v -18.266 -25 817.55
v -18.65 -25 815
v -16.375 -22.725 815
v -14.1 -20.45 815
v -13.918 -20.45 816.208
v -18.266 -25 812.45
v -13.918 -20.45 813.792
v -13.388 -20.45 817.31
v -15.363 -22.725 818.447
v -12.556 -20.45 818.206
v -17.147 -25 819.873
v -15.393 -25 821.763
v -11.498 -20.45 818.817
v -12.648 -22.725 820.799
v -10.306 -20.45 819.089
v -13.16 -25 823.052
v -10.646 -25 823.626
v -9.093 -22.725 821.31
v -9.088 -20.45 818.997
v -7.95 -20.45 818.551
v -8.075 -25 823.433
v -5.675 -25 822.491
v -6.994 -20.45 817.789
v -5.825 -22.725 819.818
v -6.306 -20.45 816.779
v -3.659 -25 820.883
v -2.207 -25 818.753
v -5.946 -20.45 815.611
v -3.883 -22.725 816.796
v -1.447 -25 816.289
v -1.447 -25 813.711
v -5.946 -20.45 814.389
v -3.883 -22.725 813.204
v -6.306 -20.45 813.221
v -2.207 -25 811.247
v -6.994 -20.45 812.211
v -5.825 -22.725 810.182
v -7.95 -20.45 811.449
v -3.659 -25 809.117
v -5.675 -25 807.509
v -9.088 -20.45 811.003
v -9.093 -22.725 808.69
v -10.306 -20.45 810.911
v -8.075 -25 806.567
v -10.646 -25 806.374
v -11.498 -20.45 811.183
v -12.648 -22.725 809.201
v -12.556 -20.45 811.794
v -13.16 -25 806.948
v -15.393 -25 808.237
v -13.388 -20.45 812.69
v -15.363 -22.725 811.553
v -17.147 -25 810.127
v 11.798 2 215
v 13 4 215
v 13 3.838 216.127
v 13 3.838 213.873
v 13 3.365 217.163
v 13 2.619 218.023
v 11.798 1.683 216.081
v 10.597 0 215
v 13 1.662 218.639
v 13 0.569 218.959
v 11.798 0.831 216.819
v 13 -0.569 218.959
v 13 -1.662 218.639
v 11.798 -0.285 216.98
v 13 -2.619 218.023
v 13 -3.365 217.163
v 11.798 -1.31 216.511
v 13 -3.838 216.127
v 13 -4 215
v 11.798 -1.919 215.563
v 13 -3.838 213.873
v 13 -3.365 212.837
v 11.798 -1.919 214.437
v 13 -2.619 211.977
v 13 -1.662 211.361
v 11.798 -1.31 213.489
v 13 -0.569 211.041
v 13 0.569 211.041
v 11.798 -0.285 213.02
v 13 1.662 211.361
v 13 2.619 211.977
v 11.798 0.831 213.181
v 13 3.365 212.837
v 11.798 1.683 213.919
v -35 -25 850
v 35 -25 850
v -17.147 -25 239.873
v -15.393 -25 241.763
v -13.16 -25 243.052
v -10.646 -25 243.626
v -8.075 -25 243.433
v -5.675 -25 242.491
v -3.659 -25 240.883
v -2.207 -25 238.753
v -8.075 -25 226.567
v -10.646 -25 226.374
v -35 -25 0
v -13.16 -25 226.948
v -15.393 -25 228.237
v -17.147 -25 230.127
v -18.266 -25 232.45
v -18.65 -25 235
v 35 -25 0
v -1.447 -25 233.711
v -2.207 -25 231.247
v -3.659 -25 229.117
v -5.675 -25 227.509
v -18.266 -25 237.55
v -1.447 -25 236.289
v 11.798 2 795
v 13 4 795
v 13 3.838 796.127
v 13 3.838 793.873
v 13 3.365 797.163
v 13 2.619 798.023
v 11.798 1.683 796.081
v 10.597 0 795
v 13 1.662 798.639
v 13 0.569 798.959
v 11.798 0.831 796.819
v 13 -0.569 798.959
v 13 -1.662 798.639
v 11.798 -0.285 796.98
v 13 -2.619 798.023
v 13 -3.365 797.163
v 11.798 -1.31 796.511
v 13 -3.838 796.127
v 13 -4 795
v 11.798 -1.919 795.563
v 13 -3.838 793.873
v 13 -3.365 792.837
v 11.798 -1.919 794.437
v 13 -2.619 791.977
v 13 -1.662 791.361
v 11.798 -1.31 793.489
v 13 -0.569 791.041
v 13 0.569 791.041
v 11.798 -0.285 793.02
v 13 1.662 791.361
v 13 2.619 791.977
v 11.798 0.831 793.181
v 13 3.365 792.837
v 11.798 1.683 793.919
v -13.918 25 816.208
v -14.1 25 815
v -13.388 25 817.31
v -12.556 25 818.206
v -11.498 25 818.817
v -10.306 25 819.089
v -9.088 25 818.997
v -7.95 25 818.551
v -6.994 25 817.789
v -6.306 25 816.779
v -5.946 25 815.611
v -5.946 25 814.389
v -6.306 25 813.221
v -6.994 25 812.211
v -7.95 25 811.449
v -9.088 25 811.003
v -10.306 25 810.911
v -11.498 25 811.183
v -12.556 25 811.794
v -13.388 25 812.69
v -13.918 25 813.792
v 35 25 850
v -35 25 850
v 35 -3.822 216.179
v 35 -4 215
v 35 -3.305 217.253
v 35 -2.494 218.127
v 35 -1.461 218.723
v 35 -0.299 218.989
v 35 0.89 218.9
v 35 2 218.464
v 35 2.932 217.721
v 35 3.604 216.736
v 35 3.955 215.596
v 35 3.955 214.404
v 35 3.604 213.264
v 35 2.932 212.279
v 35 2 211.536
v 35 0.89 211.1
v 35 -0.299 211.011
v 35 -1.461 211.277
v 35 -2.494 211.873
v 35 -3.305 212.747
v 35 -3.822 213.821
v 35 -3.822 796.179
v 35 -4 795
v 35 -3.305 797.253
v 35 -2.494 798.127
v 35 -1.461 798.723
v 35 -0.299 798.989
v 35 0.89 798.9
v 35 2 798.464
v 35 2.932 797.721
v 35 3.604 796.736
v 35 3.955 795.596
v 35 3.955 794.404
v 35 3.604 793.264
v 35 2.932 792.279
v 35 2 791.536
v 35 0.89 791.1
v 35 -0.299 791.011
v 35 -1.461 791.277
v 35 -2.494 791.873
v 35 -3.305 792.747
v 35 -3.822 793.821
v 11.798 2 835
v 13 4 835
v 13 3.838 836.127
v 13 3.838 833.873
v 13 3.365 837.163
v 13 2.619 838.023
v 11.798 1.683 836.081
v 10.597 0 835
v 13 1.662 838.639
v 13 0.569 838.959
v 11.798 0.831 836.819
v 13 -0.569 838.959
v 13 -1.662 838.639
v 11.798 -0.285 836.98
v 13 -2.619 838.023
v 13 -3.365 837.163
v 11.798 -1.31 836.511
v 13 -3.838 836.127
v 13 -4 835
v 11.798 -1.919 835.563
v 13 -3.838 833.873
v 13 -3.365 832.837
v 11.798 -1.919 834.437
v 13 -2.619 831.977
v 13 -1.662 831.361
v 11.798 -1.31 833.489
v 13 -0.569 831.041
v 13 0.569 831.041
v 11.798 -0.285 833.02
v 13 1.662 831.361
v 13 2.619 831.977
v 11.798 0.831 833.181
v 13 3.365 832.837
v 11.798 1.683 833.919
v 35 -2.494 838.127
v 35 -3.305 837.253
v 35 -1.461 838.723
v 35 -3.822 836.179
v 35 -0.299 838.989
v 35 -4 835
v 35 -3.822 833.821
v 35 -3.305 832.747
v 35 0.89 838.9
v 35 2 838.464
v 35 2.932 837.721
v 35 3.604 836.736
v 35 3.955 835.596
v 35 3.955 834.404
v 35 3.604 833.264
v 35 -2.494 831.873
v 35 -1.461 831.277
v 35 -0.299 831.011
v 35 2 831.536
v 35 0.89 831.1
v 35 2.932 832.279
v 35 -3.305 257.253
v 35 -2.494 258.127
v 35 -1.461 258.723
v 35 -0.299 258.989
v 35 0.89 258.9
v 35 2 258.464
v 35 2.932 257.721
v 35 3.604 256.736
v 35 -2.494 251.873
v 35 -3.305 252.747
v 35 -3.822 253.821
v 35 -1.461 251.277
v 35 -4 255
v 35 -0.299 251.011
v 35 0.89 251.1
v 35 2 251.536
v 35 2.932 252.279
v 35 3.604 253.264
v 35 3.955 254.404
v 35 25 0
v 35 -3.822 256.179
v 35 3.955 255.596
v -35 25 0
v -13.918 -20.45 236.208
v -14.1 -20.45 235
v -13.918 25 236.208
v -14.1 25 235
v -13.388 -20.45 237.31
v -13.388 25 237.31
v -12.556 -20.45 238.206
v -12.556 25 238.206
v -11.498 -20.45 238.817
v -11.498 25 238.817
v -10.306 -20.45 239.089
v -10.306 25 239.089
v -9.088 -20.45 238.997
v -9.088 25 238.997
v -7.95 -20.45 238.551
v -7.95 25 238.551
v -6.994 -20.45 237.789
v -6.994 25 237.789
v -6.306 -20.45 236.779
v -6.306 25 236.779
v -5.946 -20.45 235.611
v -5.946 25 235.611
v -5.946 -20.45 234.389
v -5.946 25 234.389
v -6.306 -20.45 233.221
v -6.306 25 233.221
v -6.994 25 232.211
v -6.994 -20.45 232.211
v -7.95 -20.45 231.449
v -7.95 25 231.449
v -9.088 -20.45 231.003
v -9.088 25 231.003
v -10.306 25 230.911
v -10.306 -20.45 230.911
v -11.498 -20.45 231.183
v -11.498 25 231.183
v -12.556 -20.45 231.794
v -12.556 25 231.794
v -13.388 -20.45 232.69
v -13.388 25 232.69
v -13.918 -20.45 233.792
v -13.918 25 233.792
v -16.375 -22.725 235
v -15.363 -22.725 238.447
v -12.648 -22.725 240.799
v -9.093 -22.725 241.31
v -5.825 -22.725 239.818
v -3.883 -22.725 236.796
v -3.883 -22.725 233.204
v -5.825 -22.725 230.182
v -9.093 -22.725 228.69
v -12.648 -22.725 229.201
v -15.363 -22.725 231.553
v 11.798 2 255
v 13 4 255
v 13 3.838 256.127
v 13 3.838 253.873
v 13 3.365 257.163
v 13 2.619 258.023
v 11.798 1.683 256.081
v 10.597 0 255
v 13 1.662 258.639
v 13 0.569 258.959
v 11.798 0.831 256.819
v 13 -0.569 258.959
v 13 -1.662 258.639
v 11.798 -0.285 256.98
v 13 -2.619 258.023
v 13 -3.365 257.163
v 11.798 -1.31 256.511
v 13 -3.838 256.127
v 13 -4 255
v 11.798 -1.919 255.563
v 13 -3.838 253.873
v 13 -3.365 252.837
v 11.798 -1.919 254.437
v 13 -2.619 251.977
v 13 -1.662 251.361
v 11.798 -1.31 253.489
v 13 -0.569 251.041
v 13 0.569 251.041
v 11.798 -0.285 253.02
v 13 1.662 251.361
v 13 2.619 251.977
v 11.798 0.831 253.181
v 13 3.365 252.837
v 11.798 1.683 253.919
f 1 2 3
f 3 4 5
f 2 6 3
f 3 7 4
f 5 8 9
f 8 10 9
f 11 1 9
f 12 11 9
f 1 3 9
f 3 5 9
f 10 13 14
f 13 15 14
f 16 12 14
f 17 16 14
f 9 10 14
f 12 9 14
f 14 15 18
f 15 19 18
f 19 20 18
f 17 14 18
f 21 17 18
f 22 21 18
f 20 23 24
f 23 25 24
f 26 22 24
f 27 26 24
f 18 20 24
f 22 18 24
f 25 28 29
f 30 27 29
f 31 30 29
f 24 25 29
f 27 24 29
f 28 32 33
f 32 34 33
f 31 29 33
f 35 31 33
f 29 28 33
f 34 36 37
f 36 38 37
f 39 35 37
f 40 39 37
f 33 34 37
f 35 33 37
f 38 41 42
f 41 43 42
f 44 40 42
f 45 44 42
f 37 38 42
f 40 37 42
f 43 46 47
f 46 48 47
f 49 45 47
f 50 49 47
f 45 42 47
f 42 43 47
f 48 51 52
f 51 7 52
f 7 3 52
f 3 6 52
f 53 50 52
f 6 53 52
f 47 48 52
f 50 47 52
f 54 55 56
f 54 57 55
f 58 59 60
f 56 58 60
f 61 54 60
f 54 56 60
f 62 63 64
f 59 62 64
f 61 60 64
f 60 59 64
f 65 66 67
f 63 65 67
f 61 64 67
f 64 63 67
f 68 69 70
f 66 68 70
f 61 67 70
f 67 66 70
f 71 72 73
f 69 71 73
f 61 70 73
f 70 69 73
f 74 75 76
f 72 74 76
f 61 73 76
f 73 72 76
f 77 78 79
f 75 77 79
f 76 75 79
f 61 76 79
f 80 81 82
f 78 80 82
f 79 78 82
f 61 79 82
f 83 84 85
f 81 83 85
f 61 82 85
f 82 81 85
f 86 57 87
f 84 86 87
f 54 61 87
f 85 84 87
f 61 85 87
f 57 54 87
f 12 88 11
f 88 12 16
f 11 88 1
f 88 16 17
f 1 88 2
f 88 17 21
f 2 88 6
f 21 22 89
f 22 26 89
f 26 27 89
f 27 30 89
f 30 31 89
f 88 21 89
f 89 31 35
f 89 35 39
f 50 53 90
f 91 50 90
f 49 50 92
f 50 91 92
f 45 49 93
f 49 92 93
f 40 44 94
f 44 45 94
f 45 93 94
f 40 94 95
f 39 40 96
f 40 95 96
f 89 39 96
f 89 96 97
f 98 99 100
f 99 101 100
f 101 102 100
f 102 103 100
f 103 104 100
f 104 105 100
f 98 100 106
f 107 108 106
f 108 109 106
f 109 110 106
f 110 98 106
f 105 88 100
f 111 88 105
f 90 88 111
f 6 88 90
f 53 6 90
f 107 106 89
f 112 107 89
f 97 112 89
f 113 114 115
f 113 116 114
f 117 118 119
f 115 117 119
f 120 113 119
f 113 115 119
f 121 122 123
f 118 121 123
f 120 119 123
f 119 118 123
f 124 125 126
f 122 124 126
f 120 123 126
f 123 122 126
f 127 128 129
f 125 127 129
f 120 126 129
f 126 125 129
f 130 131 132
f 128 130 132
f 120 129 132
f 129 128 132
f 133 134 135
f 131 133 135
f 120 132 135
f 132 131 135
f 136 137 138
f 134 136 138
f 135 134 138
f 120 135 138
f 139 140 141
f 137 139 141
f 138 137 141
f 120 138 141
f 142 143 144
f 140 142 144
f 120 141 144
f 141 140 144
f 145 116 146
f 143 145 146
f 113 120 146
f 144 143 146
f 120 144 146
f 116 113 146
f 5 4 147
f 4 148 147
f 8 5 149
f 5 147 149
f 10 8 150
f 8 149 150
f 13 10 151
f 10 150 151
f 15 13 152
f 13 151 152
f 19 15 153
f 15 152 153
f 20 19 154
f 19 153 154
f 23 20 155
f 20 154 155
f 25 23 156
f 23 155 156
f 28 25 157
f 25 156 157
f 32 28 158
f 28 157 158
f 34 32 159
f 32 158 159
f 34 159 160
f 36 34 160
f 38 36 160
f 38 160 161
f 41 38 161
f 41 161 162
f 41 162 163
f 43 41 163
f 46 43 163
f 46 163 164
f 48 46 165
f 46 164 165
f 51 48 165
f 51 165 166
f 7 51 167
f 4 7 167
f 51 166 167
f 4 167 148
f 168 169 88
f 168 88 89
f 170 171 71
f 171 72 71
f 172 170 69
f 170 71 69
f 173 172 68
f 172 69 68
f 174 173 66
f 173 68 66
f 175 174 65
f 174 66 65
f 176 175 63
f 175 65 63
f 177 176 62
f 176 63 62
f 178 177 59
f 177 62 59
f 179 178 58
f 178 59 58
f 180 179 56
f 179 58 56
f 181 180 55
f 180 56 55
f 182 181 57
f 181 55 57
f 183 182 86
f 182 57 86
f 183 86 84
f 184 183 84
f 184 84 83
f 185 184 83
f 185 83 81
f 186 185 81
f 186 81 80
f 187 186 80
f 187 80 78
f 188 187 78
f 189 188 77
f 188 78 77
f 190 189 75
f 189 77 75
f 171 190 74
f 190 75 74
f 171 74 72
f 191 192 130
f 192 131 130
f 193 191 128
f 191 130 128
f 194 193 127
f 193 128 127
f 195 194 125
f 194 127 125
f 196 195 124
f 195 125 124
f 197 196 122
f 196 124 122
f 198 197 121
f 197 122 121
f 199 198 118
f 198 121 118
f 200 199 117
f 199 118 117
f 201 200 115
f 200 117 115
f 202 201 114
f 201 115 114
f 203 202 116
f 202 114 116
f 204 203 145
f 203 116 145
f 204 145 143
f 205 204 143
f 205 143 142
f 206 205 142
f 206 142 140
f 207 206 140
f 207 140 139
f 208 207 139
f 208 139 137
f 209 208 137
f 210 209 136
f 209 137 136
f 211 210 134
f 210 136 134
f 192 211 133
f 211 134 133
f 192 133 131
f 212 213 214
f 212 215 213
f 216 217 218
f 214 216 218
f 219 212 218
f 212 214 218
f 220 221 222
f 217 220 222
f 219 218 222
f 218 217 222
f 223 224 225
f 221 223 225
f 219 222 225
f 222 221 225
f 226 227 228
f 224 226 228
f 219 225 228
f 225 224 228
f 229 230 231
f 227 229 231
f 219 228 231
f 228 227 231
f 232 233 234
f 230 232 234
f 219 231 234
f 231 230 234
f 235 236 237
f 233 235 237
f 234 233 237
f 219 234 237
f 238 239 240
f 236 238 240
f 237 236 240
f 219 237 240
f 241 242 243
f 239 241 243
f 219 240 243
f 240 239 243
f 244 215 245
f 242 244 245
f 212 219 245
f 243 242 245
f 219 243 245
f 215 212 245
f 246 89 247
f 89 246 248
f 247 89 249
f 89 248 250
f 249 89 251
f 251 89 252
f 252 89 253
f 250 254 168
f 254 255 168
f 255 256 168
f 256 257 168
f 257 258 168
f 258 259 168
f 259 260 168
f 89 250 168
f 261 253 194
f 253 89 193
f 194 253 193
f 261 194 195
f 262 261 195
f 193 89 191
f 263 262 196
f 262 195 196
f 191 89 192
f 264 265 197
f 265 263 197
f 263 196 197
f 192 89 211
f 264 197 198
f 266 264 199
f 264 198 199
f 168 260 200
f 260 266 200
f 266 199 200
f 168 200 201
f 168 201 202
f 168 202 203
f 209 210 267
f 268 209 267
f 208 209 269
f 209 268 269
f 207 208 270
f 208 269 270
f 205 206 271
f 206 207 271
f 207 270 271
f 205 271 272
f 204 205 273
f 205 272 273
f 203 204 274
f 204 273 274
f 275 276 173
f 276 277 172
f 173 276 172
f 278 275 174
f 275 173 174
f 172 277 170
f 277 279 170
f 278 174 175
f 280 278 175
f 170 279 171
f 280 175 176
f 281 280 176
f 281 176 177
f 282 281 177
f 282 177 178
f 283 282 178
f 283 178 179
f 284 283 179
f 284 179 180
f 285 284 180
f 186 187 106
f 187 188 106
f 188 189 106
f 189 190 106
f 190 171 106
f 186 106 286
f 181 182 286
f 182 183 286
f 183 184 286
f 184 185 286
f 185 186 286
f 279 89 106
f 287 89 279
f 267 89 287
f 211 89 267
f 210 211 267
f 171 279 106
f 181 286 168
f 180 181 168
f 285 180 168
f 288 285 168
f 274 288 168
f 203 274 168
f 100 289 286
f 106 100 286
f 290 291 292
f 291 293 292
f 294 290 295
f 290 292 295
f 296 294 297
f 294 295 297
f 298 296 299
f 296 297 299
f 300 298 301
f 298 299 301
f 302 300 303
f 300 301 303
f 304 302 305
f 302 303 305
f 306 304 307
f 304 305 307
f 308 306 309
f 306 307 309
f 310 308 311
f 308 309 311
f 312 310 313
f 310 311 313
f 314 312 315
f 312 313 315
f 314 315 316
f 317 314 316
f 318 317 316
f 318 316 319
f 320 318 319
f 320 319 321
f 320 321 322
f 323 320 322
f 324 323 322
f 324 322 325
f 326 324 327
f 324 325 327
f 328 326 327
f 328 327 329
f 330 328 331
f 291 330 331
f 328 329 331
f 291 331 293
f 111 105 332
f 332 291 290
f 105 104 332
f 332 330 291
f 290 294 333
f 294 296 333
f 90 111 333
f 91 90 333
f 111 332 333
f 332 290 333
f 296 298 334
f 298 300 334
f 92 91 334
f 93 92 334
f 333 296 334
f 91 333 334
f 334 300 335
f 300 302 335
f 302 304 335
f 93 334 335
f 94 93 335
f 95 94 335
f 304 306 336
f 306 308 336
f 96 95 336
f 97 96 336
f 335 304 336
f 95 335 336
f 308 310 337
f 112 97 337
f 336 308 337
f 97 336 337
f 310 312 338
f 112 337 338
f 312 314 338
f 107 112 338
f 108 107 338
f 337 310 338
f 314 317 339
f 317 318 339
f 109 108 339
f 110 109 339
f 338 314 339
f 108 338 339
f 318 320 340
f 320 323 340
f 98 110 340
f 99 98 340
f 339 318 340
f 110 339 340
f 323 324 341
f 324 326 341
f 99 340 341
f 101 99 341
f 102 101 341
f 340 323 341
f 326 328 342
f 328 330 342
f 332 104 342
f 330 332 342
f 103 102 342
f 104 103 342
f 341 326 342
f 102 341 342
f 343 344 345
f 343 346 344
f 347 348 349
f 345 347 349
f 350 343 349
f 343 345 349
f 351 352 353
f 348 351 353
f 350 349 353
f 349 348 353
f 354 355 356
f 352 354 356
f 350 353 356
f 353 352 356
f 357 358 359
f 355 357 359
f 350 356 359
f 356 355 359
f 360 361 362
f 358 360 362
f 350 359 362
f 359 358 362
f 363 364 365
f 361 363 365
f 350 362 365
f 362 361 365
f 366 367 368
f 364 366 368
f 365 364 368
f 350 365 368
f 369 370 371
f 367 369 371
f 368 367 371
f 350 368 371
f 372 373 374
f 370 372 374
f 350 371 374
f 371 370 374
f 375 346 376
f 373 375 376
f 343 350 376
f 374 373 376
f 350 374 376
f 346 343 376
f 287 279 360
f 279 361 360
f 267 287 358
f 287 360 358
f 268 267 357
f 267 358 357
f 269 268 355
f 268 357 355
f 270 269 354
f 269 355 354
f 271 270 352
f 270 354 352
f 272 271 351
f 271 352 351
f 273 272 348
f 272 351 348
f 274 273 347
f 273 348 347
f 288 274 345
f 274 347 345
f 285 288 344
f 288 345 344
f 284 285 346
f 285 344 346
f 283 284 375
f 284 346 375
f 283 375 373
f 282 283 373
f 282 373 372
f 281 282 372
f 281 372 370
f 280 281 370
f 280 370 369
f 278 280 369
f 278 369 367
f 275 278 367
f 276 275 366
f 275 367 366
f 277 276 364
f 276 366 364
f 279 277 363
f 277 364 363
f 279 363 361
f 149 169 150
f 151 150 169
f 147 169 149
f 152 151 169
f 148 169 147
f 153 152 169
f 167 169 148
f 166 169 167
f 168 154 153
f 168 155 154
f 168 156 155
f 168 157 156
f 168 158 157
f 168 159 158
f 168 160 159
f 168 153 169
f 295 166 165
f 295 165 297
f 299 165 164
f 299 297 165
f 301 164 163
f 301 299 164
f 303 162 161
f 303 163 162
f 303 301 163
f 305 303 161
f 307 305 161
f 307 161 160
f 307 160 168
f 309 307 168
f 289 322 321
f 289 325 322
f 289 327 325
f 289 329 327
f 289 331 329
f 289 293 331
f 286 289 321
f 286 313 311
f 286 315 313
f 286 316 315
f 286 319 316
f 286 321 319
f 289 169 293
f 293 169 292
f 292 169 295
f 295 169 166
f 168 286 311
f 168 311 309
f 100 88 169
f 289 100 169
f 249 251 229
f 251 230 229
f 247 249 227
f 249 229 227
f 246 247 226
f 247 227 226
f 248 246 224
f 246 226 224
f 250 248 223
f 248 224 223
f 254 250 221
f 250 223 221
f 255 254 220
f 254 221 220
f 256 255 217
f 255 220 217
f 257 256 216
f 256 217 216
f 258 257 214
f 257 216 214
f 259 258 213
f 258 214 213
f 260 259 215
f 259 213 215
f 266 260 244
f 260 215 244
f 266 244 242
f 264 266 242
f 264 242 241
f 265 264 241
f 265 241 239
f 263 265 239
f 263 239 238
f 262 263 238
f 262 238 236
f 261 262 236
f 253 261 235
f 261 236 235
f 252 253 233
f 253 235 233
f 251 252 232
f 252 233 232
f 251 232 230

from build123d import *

# Parameters (mm, degrees)
F0_W           = 70
F0_H           = 50
F1_DEPTH       = 850
F3_D           = 8
F3_DEPTH       = 22
F3_TIP         = 2.4034424761
F5_D           = 8.2
F5_CSINK_D     = 17.3
F5_CSINK_ANGLE = 90


with BuildPart() as f1:
    # F0 (on Top) → F1 (new body)
    with BuildSketch(Plane.XY):
        Rectangle(F0_W, F0_H)
    extrude(amount=F1_DEPTH)

    # F3
    with Locations(Plane.YZ.offset(35)):
        with Locations((0, 215), (0, 255), (0, 795), (0, 835)):
            Hole(F3_D / 2, depth=F3_DEPTH)
            with Locations((0, 0, -(F3_DEPTH + F3_TIP / 2))):  # 118° drill point
                Cone(0, F3_D / 2, F3_TIP, mode=Mode.SUBTRACT)

    # F5 (through all)
    with Locations(Plane.XZ.offset(25)):
        with Locations((-10, 235), (-10, 815)):
            CounterSinkHole(F5_D / 2, F5_CSINK_D / 2, counter_sink_angle=F5_CSINK_ANGLE)


solid = f1.part
